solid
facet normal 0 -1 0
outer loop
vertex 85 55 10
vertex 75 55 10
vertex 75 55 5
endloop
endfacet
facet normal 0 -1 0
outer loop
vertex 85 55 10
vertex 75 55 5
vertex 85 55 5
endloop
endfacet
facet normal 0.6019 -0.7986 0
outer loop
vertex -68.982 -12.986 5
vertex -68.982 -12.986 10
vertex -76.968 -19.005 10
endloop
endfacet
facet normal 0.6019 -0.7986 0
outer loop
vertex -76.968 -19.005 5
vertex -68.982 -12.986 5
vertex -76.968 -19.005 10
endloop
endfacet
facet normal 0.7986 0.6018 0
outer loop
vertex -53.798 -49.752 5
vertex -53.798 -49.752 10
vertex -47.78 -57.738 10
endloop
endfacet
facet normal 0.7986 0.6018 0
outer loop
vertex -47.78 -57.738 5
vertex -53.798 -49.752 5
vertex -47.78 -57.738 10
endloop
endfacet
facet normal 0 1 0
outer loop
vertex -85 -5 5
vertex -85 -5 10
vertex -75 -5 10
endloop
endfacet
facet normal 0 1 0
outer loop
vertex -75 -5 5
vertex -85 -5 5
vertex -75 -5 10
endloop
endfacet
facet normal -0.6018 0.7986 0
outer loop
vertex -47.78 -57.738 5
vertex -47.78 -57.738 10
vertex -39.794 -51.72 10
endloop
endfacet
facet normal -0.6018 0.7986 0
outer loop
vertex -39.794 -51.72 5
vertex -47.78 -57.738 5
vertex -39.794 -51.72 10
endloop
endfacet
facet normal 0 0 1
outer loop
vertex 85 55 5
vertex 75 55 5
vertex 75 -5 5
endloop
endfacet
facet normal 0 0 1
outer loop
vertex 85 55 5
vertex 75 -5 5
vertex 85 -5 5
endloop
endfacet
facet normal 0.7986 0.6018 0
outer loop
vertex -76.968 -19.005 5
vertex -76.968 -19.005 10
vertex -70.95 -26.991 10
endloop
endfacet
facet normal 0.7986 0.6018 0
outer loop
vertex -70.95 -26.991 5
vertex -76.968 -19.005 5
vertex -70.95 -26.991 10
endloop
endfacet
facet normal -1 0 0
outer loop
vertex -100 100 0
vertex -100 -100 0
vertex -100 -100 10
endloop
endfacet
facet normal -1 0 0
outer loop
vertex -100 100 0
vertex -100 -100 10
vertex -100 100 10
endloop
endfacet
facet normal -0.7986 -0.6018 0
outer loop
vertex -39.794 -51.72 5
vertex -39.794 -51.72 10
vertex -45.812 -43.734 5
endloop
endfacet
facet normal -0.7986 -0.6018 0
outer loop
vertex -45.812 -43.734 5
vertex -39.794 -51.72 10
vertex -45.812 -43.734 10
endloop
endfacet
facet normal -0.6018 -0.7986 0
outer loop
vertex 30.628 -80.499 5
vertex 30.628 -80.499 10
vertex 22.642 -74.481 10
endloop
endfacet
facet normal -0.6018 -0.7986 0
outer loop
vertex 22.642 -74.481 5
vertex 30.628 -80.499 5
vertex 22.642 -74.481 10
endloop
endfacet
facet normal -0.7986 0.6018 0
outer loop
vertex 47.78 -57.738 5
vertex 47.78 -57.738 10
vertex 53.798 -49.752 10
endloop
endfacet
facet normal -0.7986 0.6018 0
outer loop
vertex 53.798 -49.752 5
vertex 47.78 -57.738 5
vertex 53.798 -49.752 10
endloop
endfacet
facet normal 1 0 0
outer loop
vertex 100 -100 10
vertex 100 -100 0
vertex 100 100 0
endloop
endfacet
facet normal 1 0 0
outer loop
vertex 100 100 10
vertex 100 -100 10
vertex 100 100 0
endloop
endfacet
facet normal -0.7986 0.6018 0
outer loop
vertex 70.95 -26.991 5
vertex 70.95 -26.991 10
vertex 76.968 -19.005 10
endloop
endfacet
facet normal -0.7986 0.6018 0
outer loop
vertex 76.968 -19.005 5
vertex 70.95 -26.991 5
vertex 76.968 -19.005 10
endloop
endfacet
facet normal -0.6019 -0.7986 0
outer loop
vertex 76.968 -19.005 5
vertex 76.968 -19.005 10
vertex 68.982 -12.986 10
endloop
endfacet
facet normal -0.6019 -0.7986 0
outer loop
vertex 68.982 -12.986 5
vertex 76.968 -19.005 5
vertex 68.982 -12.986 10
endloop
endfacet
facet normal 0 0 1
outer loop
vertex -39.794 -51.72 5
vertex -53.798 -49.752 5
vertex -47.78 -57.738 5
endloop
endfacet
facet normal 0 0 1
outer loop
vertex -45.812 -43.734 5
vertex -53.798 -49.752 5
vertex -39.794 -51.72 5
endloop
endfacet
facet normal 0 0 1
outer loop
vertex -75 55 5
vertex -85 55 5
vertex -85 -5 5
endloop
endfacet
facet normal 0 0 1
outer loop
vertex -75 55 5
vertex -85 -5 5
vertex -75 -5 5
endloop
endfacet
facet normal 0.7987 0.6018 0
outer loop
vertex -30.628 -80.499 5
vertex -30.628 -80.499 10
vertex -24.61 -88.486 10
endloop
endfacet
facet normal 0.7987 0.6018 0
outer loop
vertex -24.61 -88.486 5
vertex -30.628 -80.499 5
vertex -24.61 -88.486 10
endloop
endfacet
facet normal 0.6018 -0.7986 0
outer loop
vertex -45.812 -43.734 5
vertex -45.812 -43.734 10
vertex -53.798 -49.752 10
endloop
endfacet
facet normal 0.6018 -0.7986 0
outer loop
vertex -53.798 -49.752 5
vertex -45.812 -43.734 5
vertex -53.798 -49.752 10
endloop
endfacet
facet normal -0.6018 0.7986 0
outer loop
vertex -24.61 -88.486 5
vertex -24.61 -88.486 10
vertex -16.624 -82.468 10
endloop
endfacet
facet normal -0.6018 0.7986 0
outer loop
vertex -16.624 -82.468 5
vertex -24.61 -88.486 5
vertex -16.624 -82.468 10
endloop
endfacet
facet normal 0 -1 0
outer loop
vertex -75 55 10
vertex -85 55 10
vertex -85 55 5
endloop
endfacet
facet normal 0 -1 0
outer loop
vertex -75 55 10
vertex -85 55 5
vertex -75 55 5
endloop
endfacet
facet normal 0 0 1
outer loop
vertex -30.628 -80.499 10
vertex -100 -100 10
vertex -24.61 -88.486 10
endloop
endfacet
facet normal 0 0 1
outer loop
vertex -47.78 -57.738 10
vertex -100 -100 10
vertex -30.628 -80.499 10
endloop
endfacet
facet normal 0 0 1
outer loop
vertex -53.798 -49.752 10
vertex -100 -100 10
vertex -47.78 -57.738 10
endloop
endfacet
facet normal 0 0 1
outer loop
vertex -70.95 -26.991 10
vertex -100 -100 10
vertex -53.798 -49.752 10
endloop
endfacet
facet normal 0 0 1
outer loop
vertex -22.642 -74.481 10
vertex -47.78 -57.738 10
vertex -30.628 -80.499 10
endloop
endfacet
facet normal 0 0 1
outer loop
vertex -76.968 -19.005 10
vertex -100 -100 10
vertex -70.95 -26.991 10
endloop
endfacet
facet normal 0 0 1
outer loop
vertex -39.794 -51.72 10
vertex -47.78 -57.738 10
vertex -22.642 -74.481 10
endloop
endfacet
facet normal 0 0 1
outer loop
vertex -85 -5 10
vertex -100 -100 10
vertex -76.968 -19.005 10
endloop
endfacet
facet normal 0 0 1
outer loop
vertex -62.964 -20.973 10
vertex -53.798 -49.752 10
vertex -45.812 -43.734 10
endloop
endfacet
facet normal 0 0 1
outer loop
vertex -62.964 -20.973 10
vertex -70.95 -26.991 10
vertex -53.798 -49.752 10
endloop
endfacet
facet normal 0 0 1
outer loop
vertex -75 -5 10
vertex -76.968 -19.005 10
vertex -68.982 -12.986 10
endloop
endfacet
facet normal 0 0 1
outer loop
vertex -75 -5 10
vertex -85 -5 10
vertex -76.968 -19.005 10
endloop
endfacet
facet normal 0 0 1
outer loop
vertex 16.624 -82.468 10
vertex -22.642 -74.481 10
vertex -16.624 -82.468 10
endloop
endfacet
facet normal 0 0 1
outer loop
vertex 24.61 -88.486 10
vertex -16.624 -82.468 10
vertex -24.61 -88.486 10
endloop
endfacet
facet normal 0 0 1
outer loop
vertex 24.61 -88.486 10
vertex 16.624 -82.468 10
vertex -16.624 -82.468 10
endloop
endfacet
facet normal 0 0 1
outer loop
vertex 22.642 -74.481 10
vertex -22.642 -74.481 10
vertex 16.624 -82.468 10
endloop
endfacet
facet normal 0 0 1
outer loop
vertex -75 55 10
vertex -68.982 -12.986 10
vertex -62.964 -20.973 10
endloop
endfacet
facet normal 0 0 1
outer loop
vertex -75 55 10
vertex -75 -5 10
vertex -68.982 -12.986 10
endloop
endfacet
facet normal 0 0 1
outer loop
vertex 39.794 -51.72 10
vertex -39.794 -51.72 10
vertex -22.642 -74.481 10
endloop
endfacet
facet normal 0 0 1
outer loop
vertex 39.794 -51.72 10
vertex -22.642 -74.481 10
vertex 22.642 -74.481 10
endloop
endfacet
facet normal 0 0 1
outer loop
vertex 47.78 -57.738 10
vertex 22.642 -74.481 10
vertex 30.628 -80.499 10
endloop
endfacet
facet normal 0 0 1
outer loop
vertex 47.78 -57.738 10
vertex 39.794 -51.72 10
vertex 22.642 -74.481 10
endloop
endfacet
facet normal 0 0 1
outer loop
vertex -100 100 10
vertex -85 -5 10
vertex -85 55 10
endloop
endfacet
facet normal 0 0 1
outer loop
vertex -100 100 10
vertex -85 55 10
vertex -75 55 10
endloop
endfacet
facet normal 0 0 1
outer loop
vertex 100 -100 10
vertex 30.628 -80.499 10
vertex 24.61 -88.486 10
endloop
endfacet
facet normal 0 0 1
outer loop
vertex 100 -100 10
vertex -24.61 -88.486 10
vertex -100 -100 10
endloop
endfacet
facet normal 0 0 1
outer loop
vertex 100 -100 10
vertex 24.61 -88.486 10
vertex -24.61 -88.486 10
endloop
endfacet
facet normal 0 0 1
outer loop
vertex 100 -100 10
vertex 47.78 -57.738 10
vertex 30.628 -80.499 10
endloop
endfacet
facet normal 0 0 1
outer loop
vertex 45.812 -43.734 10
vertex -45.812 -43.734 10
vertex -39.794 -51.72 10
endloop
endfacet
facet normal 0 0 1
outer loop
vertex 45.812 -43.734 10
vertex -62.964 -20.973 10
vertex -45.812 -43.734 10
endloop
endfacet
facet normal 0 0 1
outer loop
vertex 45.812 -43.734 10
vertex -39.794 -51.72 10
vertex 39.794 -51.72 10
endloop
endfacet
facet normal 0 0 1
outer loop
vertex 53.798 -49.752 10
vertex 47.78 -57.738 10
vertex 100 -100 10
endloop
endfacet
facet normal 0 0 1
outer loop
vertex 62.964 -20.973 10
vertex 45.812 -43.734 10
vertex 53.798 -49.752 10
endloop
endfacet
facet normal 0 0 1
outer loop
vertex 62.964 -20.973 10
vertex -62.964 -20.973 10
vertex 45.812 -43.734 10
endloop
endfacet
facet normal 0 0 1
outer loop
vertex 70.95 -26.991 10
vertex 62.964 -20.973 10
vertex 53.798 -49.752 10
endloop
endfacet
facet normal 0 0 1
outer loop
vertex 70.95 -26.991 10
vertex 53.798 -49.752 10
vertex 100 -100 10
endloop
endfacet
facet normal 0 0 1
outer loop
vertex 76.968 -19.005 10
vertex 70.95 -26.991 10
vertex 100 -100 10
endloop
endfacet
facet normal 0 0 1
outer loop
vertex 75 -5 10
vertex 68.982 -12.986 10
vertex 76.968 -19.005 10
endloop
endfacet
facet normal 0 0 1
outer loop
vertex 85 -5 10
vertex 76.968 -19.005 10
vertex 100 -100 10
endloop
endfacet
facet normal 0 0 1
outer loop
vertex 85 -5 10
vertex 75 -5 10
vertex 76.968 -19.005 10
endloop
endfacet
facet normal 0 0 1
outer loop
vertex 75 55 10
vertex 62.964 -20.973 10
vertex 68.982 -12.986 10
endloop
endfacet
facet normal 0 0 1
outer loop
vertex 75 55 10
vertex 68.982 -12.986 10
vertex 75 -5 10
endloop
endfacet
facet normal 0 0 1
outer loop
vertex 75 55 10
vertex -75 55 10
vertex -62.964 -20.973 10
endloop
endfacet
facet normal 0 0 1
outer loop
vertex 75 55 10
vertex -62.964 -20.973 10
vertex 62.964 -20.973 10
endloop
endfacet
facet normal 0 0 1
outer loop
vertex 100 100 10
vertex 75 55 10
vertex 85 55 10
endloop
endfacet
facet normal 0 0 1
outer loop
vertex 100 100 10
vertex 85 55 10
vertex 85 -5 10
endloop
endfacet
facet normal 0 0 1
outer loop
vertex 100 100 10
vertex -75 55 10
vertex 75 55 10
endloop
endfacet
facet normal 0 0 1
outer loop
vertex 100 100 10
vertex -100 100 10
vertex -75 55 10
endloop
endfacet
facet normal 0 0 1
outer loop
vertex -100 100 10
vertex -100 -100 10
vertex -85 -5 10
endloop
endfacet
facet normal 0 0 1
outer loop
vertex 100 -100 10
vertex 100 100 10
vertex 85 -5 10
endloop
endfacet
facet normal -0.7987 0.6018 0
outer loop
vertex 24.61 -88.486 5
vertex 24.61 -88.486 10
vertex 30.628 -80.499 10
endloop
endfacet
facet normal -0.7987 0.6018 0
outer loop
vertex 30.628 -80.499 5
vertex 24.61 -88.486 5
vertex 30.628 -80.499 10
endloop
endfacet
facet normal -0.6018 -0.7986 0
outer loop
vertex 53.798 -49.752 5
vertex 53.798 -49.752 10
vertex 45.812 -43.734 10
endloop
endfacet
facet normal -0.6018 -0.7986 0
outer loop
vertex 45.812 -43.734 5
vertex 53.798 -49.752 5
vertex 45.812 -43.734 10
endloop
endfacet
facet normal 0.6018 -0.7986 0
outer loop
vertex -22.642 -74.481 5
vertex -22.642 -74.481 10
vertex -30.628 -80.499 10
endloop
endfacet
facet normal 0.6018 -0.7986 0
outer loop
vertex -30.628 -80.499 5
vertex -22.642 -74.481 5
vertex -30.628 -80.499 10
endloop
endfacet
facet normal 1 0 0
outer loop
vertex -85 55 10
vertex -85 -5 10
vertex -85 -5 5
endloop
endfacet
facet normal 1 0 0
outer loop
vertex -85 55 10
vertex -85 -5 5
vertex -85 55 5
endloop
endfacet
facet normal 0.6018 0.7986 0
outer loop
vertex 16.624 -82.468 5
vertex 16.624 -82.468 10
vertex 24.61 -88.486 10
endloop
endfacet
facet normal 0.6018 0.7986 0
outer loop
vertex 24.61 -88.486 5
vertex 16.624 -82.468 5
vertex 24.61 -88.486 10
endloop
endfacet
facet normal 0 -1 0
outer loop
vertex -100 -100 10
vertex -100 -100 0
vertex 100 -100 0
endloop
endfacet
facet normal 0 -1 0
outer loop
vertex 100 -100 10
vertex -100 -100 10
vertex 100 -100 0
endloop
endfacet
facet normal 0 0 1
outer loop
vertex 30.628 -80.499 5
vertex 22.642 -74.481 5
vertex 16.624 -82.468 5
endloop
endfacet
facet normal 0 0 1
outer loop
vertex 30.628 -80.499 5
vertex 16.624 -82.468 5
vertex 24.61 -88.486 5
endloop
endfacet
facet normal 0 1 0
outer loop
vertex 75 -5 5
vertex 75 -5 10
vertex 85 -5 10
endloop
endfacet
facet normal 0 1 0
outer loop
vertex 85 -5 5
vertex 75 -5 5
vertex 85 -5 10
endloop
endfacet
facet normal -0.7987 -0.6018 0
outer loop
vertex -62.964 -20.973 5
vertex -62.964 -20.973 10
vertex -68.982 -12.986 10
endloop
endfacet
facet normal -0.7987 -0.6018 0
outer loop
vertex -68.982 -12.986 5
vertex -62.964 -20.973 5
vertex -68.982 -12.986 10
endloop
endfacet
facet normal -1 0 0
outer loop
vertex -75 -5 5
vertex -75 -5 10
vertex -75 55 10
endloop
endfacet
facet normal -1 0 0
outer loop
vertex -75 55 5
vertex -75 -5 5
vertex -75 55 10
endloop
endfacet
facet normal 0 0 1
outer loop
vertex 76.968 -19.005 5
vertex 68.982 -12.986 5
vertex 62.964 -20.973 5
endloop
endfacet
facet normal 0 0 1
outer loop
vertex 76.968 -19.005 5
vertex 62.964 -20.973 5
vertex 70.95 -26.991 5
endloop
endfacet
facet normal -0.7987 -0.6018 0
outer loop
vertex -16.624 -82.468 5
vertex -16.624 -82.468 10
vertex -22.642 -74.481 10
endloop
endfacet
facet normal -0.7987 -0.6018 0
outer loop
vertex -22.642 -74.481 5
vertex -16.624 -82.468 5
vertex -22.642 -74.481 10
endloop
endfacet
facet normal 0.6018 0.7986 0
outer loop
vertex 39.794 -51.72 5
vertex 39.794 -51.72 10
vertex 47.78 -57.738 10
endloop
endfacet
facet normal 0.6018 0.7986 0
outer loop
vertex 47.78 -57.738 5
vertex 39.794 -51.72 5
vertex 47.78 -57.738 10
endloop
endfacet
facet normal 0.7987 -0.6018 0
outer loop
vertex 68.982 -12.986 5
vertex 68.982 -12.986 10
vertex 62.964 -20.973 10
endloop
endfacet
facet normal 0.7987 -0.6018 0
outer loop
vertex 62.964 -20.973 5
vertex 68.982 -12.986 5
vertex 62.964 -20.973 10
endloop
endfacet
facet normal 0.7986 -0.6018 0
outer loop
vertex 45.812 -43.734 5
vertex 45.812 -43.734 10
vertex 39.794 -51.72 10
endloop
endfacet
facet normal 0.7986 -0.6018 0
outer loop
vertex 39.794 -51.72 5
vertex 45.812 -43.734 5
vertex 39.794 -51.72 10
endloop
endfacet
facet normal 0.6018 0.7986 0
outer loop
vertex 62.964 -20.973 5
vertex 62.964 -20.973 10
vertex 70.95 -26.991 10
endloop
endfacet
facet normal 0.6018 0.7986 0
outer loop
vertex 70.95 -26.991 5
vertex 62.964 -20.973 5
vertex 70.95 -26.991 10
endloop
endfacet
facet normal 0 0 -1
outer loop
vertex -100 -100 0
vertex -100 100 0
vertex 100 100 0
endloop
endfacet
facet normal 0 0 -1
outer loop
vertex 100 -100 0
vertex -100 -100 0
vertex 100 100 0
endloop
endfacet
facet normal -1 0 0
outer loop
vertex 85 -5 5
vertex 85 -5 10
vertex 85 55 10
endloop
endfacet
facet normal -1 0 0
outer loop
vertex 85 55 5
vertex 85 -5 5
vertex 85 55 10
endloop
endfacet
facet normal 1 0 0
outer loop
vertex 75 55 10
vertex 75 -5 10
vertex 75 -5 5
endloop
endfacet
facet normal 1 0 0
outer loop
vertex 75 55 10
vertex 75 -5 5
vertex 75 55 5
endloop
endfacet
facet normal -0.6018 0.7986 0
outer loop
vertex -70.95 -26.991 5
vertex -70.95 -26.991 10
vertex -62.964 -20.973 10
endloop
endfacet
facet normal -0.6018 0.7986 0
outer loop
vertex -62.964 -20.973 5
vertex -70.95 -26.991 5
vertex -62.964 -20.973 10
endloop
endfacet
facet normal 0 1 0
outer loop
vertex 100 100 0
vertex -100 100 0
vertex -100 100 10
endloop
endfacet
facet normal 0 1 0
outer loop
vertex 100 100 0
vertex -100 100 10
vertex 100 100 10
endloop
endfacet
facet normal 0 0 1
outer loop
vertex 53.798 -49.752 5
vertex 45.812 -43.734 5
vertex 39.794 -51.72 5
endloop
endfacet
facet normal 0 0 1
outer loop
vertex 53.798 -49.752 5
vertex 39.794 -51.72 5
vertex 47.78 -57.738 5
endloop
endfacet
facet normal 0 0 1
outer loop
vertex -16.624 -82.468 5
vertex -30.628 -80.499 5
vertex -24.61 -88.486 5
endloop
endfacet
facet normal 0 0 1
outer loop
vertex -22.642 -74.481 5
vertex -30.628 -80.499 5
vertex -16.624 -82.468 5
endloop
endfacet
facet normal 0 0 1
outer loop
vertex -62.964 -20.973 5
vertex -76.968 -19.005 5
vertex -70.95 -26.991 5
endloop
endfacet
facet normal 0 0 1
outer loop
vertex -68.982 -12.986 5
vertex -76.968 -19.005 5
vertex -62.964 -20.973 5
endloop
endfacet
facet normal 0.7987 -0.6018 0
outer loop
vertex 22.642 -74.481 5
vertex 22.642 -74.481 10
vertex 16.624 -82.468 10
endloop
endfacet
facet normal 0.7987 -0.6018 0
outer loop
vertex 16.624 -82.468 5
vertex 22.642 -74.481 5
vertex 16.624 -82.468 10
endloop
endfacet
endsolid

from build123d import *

# Parameters (mm, degrees)
F0_W     = 200
F0_H     = 200
F1_DEPTH = 10
F2_W     = 10
F2_H     = 60
F3_DEPTH = 5


with BuildPart() as f1:
    # F0 (on Top) → F1 (new body)
    with BuildSketch(Plane.XY):
        Rectangle(F0_W, F0_H)
    extrude(amount=F1_DEPTH)

    # F2 (on face) → F3 (cut)
    with BuildSketch(Plane.XY.offset(10)):
        with Locations((-80, 25)):
            Rectangle(F2_W, F2_H)
        with Locations((80, 25)):
            Rectangle(F2_W, F2_H)
        Polygon((-68.98185, -12.986355), (-76.968205, -19.004505), (-70.950055, -26.99086), (-62.9637, -20.97271), align=None)
        Polygon((-45.811971, -43.733822), (-53.798326, -49.751972), (-47.780176, -57.738328), (-39.793821, -51.720177), align=None)
        Polygon((-22.642093, -74.481289), (-30.628448, -80.49944), (-24.610298, -88.485795), (-16.623943, -82.467644), align=None)
        Polygon((22.642093, -74.481289), (16.623943, -82.467644), (24.610298, -88.485795), (30.628448, -80.49944), align=None)
        Polygon((76.968205, -19.004505), (68.98185, -12.986355), (62.9637, -20.97271), (70.950055, -26.99086), align=None)
        Polygon((47.780176, -57.738328), (53.798326, -49.751972), (45.811971, -43.733822), (39.793821, -51.720177), align=None)
    extrude(amount=-F3_DEPTH, mode=Mode.SUBTRACT)


solid = f1.part
